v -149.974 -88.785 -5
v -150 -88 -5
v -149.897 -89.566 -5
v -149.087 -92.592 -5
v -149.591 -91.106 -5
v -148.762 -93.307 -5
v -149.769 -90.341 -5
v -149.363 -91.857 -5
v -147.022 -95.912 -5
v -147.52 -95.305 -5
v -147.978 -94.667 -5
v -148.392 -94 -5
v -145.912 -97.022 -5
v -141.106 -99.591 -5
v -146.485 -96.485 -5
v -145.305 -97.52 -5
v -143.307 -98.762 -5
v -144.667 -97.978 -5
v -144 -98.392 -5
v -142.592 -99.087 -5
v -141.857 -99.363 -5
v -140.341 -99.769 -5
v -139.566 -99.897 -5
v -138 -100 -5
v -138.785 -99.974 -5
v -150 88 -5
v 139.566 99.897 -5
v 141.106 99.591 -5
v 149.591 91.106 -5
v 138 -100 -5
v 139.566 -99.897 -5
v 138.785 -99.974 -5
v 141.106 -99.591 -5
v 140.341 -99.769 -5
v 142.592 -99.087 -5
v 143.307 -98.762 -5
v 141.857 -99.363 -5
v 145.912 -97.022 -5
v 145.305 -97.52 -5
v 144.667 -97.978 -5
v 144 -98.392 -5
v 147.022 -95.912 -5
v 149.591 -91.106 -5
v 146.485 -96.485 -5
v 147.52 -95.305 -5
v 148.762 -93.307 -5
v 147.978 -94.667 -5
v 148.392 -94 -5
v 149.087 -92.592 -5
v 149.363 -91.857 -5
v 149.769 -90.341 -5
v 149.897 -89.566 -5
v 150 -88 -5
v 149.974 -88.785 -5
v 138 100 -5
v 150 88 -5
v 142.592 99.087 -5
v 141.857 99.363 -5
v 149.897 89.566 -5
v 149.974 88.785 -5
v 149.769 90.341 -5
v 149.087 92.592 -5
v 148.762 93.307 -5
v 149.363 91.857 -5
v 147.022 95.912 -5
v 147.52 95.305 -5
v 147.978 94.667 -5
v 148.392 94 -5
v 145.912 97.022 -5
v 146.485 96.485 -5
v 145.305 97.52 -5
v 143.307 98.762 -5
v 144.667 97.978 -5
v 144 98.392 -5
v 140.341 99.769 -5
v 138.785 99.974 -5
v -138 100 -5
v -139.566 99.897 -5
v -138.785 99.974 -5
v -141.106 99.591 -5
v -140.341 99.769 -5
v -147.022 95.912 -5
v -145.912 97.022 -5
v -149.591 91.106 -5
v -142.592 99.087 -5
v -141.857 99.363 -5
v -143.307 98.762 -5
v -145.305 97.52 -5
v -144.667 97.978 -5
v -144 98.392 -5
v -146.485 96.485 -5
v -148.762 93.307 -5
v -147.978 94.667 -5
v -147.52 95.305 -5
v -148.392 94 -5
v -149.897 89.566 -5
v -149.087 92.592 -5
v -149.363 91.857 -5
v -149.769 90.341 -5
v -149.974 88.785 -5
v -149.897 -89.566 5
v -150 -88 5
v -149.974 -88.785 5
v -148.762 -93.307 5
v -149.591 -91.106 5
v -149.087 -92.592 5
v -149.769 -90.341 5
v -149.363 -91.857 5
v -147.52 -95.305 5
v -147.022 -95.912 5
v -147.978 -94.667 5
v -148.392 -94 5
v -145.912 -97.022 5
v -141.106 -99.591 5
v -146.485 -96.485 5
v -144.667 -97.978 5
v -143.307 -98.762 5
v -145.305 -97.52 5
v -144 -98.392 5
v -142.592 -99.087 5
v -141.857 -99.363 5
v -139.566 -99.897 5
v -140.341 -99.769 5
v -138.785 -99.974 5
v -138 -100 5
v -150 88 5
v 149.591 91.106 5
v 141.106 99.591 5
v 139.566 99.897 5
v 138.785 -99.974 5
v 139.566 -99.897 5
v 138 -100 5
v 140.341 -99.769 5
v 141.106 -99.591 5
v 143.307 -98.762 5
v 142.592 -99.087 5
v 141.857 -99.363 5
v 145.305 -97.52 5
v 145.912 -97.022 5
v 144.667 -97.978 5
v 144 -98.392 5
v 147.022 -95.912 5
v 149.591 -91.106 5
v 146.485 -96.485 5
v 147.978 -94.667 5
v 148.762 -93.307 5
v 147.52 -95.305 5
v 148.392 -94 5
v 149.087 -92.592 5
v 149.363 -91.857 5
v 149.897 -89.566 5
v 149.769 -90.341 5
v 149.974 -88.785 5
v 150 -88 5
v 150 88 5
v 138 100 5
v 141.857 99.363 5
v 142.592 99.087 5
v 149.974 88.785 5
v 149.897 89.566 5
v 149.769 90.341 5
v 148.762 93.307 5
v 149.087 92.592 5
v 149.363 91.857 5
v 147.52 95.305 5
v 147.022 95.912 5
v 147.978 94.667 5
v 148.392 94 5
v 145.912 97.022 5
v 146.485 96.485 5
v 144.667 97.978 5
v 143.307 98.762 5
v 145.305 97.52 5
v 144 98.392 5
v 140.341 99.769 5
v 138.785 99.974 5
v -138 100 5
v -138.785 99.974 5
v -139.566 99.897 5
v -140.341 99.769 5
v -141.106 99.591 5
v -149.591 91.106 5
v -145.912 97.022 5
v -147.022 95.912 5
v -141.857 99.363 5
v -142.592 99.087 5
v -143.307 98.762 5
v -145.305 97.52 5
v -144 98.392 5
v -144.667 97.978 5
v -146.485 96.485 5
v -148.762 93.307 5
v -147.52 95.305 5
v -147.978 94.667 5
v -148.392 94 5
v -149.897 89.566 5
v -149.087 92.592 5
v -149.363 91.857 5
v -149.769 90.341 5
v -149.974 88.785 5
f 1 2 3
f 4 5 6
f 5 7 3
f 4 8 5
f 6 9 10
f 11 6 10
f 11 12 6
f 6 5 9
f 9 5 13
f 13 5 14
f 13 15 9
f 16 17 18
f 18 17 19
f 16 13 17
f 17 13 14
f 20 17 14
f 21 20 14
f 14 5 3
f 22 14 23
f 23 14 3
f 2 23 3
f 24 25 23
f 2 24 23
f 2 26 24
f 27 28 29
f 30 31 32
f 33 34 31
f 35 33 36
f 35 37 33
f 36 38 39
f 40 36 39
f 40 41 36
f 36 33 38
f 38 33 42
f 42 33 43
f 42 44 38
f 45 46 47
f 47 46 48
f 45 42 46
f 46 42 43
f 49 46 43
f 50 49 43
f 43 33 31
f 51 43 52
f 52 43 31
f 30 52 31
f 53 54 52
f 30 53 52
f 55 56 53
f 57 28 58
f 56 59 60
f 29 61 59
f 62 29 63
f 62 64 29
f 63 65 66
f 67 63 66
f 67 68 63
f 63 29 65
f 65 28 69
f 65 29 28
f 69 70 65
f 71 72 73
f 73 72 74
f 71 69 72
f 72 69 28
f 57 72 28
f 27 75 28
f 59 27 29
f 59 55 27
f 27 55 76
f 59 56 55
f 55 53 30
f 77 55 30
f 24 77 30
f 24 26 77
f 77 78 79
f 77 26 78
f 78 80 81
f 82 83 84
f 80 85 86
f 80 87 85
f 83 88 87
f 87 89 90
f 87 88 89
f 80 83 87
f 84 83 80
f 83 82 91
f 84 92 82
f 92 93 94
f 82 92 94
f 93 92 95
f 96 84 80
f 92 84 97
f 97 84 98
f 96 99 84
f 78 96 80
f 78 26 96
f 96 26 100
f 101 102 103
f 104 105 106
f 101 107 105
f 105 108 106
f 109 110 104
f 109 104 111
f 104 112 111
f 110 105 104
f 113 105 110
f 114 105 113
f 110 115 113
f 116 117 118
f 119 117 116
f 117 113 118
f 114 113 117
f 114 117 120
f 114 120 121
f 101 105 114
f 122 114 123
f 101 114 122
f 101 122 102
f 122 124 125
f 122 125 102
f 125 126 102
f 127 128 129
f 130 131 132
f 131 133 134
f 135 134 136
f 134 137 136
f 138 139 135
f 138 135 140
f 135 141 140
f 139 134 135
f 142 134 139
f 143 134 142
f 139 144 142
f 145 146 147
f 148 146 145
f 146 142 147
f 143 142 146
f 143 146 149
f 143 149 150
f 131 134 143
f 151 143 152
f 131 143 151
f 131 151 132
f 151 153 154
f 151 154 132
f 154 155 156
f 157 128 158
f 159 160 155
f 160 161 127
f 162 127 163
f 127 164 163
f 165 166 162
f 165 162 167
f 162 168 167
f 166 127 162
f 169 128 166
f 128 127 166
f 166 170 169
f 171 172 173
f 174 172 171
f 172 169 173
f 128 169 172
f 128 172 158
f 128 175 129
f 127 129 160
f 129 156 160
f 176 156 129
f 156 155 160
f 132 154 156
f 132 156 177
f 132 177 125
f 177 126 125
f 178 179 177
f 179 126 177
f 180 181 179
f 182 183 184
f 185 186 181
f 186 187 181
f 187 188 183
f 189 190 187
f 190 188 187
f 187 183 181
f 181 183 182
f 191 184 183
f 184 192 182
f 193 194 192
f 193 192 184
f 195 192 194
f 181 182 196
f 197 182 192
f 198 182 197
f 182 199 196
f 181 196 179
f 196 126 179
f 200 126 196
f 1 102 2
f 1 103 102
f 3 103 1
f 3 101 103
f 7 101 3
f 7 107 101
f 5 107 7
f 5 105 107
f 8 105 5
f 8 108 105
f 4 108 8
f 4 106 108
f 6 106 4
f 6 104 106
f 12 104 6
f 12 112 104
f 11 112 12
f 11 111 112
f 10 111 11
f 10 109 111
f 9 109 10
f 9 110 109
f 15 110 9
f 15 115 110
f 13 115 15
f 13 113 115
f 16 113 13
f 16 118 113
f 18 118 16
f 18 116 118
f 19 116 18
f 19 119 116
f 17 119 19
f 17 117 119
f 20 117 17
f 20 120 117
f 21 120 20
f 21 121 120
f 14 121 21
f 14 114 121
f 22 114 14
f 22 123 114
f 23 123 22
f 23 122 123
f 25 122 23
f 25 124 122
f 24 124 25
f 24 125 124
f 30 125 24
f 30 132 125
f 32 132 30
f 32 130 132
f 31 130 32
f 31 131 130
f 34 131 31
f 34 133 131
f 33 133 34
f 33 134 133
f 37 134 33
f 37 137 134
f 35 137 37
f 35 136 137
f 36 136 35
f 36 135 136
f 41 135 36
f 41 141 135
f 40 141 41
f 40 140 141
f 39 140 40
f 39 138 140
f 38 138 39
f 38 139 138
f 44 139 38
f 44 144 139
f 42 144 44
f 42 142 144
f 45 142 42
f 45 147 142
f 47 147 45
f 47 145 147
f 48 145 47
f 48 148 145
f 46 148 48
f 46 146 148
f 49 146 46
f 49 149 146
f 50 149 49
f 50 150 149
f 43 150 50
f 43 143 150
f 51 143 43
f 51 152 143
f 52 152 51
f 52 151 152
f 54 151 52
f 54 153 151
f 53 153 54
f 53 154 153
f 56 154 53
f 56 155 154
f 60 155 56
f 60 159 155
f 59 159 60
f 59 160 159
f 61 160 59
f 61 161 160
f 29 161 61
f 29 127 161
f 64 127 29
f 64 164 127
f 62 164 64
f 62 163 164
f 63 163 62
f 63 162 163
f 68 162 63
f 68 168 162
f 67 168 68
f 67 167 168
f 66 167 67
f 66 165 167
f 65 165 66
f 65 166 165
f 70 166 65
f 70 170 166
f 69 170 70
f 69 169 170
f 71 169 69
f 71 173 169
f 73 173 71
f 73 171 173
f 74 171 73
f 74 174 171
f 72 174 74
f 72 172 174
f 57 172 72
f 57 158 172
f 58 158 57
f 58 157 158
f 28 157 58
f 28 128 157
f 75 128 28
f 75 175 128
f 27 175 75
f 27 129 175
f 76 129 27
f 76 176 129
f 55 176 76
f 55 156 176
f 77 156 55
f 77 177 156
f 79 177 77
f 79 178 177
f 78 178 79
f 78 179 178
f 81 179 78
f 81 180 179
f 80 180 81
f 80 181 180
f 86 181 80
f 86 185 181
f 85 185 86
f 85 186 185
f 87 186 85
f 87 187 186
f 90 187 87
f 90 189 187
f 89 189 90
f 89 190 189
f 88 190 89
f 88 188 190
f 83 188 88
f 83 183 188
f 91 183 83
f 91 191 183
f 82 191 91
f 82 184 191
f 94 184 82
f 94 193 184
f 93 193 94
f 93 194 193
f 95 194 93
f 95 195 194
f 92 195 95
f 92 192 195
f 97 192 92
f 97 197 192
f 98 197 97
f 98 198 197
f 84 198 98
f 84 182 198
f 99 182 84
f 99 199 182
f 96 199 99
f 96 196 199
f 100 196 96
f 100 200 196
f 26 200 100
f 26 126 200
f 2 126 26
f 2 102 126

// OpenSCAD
// Aluminium tooling plate (plain sheet, no holes/features)

// Parameters
plate_length = 300;      //[150:600:1]
plate_width  = 200;      //[100:400:1]
plate_thickness = 10;    //[5:20:1]
corner_radius = 12;      //[0:24:1]  // set 0 for sharp corners

$fn = 96;

// 2D rounded rectangle (robust, non-blank)
module rounded_rect_2d(L, W, R) {
    r = max(0, min(R, min(L, W)/2));
    if (r <= 0) {
        square([L, W], center=true);
    } else {
        hull() {
            for (sx = [-1, 1], sy = [-1, 1])
                translate([sx*(L/2 - r), sy*(W/2 - r)])
                    circle(r=r);
        }
    }
}

// 3D plate
module tooling_plate_plain() {
    linear_extrude(height=plate_thickness, center=true, convexity=10)
        rounded_rect_2d(plate_length, plate_width, corner_radius);
}

// Render
color([0.75, 0.75, 0.78]) tooling_plate_plain();
